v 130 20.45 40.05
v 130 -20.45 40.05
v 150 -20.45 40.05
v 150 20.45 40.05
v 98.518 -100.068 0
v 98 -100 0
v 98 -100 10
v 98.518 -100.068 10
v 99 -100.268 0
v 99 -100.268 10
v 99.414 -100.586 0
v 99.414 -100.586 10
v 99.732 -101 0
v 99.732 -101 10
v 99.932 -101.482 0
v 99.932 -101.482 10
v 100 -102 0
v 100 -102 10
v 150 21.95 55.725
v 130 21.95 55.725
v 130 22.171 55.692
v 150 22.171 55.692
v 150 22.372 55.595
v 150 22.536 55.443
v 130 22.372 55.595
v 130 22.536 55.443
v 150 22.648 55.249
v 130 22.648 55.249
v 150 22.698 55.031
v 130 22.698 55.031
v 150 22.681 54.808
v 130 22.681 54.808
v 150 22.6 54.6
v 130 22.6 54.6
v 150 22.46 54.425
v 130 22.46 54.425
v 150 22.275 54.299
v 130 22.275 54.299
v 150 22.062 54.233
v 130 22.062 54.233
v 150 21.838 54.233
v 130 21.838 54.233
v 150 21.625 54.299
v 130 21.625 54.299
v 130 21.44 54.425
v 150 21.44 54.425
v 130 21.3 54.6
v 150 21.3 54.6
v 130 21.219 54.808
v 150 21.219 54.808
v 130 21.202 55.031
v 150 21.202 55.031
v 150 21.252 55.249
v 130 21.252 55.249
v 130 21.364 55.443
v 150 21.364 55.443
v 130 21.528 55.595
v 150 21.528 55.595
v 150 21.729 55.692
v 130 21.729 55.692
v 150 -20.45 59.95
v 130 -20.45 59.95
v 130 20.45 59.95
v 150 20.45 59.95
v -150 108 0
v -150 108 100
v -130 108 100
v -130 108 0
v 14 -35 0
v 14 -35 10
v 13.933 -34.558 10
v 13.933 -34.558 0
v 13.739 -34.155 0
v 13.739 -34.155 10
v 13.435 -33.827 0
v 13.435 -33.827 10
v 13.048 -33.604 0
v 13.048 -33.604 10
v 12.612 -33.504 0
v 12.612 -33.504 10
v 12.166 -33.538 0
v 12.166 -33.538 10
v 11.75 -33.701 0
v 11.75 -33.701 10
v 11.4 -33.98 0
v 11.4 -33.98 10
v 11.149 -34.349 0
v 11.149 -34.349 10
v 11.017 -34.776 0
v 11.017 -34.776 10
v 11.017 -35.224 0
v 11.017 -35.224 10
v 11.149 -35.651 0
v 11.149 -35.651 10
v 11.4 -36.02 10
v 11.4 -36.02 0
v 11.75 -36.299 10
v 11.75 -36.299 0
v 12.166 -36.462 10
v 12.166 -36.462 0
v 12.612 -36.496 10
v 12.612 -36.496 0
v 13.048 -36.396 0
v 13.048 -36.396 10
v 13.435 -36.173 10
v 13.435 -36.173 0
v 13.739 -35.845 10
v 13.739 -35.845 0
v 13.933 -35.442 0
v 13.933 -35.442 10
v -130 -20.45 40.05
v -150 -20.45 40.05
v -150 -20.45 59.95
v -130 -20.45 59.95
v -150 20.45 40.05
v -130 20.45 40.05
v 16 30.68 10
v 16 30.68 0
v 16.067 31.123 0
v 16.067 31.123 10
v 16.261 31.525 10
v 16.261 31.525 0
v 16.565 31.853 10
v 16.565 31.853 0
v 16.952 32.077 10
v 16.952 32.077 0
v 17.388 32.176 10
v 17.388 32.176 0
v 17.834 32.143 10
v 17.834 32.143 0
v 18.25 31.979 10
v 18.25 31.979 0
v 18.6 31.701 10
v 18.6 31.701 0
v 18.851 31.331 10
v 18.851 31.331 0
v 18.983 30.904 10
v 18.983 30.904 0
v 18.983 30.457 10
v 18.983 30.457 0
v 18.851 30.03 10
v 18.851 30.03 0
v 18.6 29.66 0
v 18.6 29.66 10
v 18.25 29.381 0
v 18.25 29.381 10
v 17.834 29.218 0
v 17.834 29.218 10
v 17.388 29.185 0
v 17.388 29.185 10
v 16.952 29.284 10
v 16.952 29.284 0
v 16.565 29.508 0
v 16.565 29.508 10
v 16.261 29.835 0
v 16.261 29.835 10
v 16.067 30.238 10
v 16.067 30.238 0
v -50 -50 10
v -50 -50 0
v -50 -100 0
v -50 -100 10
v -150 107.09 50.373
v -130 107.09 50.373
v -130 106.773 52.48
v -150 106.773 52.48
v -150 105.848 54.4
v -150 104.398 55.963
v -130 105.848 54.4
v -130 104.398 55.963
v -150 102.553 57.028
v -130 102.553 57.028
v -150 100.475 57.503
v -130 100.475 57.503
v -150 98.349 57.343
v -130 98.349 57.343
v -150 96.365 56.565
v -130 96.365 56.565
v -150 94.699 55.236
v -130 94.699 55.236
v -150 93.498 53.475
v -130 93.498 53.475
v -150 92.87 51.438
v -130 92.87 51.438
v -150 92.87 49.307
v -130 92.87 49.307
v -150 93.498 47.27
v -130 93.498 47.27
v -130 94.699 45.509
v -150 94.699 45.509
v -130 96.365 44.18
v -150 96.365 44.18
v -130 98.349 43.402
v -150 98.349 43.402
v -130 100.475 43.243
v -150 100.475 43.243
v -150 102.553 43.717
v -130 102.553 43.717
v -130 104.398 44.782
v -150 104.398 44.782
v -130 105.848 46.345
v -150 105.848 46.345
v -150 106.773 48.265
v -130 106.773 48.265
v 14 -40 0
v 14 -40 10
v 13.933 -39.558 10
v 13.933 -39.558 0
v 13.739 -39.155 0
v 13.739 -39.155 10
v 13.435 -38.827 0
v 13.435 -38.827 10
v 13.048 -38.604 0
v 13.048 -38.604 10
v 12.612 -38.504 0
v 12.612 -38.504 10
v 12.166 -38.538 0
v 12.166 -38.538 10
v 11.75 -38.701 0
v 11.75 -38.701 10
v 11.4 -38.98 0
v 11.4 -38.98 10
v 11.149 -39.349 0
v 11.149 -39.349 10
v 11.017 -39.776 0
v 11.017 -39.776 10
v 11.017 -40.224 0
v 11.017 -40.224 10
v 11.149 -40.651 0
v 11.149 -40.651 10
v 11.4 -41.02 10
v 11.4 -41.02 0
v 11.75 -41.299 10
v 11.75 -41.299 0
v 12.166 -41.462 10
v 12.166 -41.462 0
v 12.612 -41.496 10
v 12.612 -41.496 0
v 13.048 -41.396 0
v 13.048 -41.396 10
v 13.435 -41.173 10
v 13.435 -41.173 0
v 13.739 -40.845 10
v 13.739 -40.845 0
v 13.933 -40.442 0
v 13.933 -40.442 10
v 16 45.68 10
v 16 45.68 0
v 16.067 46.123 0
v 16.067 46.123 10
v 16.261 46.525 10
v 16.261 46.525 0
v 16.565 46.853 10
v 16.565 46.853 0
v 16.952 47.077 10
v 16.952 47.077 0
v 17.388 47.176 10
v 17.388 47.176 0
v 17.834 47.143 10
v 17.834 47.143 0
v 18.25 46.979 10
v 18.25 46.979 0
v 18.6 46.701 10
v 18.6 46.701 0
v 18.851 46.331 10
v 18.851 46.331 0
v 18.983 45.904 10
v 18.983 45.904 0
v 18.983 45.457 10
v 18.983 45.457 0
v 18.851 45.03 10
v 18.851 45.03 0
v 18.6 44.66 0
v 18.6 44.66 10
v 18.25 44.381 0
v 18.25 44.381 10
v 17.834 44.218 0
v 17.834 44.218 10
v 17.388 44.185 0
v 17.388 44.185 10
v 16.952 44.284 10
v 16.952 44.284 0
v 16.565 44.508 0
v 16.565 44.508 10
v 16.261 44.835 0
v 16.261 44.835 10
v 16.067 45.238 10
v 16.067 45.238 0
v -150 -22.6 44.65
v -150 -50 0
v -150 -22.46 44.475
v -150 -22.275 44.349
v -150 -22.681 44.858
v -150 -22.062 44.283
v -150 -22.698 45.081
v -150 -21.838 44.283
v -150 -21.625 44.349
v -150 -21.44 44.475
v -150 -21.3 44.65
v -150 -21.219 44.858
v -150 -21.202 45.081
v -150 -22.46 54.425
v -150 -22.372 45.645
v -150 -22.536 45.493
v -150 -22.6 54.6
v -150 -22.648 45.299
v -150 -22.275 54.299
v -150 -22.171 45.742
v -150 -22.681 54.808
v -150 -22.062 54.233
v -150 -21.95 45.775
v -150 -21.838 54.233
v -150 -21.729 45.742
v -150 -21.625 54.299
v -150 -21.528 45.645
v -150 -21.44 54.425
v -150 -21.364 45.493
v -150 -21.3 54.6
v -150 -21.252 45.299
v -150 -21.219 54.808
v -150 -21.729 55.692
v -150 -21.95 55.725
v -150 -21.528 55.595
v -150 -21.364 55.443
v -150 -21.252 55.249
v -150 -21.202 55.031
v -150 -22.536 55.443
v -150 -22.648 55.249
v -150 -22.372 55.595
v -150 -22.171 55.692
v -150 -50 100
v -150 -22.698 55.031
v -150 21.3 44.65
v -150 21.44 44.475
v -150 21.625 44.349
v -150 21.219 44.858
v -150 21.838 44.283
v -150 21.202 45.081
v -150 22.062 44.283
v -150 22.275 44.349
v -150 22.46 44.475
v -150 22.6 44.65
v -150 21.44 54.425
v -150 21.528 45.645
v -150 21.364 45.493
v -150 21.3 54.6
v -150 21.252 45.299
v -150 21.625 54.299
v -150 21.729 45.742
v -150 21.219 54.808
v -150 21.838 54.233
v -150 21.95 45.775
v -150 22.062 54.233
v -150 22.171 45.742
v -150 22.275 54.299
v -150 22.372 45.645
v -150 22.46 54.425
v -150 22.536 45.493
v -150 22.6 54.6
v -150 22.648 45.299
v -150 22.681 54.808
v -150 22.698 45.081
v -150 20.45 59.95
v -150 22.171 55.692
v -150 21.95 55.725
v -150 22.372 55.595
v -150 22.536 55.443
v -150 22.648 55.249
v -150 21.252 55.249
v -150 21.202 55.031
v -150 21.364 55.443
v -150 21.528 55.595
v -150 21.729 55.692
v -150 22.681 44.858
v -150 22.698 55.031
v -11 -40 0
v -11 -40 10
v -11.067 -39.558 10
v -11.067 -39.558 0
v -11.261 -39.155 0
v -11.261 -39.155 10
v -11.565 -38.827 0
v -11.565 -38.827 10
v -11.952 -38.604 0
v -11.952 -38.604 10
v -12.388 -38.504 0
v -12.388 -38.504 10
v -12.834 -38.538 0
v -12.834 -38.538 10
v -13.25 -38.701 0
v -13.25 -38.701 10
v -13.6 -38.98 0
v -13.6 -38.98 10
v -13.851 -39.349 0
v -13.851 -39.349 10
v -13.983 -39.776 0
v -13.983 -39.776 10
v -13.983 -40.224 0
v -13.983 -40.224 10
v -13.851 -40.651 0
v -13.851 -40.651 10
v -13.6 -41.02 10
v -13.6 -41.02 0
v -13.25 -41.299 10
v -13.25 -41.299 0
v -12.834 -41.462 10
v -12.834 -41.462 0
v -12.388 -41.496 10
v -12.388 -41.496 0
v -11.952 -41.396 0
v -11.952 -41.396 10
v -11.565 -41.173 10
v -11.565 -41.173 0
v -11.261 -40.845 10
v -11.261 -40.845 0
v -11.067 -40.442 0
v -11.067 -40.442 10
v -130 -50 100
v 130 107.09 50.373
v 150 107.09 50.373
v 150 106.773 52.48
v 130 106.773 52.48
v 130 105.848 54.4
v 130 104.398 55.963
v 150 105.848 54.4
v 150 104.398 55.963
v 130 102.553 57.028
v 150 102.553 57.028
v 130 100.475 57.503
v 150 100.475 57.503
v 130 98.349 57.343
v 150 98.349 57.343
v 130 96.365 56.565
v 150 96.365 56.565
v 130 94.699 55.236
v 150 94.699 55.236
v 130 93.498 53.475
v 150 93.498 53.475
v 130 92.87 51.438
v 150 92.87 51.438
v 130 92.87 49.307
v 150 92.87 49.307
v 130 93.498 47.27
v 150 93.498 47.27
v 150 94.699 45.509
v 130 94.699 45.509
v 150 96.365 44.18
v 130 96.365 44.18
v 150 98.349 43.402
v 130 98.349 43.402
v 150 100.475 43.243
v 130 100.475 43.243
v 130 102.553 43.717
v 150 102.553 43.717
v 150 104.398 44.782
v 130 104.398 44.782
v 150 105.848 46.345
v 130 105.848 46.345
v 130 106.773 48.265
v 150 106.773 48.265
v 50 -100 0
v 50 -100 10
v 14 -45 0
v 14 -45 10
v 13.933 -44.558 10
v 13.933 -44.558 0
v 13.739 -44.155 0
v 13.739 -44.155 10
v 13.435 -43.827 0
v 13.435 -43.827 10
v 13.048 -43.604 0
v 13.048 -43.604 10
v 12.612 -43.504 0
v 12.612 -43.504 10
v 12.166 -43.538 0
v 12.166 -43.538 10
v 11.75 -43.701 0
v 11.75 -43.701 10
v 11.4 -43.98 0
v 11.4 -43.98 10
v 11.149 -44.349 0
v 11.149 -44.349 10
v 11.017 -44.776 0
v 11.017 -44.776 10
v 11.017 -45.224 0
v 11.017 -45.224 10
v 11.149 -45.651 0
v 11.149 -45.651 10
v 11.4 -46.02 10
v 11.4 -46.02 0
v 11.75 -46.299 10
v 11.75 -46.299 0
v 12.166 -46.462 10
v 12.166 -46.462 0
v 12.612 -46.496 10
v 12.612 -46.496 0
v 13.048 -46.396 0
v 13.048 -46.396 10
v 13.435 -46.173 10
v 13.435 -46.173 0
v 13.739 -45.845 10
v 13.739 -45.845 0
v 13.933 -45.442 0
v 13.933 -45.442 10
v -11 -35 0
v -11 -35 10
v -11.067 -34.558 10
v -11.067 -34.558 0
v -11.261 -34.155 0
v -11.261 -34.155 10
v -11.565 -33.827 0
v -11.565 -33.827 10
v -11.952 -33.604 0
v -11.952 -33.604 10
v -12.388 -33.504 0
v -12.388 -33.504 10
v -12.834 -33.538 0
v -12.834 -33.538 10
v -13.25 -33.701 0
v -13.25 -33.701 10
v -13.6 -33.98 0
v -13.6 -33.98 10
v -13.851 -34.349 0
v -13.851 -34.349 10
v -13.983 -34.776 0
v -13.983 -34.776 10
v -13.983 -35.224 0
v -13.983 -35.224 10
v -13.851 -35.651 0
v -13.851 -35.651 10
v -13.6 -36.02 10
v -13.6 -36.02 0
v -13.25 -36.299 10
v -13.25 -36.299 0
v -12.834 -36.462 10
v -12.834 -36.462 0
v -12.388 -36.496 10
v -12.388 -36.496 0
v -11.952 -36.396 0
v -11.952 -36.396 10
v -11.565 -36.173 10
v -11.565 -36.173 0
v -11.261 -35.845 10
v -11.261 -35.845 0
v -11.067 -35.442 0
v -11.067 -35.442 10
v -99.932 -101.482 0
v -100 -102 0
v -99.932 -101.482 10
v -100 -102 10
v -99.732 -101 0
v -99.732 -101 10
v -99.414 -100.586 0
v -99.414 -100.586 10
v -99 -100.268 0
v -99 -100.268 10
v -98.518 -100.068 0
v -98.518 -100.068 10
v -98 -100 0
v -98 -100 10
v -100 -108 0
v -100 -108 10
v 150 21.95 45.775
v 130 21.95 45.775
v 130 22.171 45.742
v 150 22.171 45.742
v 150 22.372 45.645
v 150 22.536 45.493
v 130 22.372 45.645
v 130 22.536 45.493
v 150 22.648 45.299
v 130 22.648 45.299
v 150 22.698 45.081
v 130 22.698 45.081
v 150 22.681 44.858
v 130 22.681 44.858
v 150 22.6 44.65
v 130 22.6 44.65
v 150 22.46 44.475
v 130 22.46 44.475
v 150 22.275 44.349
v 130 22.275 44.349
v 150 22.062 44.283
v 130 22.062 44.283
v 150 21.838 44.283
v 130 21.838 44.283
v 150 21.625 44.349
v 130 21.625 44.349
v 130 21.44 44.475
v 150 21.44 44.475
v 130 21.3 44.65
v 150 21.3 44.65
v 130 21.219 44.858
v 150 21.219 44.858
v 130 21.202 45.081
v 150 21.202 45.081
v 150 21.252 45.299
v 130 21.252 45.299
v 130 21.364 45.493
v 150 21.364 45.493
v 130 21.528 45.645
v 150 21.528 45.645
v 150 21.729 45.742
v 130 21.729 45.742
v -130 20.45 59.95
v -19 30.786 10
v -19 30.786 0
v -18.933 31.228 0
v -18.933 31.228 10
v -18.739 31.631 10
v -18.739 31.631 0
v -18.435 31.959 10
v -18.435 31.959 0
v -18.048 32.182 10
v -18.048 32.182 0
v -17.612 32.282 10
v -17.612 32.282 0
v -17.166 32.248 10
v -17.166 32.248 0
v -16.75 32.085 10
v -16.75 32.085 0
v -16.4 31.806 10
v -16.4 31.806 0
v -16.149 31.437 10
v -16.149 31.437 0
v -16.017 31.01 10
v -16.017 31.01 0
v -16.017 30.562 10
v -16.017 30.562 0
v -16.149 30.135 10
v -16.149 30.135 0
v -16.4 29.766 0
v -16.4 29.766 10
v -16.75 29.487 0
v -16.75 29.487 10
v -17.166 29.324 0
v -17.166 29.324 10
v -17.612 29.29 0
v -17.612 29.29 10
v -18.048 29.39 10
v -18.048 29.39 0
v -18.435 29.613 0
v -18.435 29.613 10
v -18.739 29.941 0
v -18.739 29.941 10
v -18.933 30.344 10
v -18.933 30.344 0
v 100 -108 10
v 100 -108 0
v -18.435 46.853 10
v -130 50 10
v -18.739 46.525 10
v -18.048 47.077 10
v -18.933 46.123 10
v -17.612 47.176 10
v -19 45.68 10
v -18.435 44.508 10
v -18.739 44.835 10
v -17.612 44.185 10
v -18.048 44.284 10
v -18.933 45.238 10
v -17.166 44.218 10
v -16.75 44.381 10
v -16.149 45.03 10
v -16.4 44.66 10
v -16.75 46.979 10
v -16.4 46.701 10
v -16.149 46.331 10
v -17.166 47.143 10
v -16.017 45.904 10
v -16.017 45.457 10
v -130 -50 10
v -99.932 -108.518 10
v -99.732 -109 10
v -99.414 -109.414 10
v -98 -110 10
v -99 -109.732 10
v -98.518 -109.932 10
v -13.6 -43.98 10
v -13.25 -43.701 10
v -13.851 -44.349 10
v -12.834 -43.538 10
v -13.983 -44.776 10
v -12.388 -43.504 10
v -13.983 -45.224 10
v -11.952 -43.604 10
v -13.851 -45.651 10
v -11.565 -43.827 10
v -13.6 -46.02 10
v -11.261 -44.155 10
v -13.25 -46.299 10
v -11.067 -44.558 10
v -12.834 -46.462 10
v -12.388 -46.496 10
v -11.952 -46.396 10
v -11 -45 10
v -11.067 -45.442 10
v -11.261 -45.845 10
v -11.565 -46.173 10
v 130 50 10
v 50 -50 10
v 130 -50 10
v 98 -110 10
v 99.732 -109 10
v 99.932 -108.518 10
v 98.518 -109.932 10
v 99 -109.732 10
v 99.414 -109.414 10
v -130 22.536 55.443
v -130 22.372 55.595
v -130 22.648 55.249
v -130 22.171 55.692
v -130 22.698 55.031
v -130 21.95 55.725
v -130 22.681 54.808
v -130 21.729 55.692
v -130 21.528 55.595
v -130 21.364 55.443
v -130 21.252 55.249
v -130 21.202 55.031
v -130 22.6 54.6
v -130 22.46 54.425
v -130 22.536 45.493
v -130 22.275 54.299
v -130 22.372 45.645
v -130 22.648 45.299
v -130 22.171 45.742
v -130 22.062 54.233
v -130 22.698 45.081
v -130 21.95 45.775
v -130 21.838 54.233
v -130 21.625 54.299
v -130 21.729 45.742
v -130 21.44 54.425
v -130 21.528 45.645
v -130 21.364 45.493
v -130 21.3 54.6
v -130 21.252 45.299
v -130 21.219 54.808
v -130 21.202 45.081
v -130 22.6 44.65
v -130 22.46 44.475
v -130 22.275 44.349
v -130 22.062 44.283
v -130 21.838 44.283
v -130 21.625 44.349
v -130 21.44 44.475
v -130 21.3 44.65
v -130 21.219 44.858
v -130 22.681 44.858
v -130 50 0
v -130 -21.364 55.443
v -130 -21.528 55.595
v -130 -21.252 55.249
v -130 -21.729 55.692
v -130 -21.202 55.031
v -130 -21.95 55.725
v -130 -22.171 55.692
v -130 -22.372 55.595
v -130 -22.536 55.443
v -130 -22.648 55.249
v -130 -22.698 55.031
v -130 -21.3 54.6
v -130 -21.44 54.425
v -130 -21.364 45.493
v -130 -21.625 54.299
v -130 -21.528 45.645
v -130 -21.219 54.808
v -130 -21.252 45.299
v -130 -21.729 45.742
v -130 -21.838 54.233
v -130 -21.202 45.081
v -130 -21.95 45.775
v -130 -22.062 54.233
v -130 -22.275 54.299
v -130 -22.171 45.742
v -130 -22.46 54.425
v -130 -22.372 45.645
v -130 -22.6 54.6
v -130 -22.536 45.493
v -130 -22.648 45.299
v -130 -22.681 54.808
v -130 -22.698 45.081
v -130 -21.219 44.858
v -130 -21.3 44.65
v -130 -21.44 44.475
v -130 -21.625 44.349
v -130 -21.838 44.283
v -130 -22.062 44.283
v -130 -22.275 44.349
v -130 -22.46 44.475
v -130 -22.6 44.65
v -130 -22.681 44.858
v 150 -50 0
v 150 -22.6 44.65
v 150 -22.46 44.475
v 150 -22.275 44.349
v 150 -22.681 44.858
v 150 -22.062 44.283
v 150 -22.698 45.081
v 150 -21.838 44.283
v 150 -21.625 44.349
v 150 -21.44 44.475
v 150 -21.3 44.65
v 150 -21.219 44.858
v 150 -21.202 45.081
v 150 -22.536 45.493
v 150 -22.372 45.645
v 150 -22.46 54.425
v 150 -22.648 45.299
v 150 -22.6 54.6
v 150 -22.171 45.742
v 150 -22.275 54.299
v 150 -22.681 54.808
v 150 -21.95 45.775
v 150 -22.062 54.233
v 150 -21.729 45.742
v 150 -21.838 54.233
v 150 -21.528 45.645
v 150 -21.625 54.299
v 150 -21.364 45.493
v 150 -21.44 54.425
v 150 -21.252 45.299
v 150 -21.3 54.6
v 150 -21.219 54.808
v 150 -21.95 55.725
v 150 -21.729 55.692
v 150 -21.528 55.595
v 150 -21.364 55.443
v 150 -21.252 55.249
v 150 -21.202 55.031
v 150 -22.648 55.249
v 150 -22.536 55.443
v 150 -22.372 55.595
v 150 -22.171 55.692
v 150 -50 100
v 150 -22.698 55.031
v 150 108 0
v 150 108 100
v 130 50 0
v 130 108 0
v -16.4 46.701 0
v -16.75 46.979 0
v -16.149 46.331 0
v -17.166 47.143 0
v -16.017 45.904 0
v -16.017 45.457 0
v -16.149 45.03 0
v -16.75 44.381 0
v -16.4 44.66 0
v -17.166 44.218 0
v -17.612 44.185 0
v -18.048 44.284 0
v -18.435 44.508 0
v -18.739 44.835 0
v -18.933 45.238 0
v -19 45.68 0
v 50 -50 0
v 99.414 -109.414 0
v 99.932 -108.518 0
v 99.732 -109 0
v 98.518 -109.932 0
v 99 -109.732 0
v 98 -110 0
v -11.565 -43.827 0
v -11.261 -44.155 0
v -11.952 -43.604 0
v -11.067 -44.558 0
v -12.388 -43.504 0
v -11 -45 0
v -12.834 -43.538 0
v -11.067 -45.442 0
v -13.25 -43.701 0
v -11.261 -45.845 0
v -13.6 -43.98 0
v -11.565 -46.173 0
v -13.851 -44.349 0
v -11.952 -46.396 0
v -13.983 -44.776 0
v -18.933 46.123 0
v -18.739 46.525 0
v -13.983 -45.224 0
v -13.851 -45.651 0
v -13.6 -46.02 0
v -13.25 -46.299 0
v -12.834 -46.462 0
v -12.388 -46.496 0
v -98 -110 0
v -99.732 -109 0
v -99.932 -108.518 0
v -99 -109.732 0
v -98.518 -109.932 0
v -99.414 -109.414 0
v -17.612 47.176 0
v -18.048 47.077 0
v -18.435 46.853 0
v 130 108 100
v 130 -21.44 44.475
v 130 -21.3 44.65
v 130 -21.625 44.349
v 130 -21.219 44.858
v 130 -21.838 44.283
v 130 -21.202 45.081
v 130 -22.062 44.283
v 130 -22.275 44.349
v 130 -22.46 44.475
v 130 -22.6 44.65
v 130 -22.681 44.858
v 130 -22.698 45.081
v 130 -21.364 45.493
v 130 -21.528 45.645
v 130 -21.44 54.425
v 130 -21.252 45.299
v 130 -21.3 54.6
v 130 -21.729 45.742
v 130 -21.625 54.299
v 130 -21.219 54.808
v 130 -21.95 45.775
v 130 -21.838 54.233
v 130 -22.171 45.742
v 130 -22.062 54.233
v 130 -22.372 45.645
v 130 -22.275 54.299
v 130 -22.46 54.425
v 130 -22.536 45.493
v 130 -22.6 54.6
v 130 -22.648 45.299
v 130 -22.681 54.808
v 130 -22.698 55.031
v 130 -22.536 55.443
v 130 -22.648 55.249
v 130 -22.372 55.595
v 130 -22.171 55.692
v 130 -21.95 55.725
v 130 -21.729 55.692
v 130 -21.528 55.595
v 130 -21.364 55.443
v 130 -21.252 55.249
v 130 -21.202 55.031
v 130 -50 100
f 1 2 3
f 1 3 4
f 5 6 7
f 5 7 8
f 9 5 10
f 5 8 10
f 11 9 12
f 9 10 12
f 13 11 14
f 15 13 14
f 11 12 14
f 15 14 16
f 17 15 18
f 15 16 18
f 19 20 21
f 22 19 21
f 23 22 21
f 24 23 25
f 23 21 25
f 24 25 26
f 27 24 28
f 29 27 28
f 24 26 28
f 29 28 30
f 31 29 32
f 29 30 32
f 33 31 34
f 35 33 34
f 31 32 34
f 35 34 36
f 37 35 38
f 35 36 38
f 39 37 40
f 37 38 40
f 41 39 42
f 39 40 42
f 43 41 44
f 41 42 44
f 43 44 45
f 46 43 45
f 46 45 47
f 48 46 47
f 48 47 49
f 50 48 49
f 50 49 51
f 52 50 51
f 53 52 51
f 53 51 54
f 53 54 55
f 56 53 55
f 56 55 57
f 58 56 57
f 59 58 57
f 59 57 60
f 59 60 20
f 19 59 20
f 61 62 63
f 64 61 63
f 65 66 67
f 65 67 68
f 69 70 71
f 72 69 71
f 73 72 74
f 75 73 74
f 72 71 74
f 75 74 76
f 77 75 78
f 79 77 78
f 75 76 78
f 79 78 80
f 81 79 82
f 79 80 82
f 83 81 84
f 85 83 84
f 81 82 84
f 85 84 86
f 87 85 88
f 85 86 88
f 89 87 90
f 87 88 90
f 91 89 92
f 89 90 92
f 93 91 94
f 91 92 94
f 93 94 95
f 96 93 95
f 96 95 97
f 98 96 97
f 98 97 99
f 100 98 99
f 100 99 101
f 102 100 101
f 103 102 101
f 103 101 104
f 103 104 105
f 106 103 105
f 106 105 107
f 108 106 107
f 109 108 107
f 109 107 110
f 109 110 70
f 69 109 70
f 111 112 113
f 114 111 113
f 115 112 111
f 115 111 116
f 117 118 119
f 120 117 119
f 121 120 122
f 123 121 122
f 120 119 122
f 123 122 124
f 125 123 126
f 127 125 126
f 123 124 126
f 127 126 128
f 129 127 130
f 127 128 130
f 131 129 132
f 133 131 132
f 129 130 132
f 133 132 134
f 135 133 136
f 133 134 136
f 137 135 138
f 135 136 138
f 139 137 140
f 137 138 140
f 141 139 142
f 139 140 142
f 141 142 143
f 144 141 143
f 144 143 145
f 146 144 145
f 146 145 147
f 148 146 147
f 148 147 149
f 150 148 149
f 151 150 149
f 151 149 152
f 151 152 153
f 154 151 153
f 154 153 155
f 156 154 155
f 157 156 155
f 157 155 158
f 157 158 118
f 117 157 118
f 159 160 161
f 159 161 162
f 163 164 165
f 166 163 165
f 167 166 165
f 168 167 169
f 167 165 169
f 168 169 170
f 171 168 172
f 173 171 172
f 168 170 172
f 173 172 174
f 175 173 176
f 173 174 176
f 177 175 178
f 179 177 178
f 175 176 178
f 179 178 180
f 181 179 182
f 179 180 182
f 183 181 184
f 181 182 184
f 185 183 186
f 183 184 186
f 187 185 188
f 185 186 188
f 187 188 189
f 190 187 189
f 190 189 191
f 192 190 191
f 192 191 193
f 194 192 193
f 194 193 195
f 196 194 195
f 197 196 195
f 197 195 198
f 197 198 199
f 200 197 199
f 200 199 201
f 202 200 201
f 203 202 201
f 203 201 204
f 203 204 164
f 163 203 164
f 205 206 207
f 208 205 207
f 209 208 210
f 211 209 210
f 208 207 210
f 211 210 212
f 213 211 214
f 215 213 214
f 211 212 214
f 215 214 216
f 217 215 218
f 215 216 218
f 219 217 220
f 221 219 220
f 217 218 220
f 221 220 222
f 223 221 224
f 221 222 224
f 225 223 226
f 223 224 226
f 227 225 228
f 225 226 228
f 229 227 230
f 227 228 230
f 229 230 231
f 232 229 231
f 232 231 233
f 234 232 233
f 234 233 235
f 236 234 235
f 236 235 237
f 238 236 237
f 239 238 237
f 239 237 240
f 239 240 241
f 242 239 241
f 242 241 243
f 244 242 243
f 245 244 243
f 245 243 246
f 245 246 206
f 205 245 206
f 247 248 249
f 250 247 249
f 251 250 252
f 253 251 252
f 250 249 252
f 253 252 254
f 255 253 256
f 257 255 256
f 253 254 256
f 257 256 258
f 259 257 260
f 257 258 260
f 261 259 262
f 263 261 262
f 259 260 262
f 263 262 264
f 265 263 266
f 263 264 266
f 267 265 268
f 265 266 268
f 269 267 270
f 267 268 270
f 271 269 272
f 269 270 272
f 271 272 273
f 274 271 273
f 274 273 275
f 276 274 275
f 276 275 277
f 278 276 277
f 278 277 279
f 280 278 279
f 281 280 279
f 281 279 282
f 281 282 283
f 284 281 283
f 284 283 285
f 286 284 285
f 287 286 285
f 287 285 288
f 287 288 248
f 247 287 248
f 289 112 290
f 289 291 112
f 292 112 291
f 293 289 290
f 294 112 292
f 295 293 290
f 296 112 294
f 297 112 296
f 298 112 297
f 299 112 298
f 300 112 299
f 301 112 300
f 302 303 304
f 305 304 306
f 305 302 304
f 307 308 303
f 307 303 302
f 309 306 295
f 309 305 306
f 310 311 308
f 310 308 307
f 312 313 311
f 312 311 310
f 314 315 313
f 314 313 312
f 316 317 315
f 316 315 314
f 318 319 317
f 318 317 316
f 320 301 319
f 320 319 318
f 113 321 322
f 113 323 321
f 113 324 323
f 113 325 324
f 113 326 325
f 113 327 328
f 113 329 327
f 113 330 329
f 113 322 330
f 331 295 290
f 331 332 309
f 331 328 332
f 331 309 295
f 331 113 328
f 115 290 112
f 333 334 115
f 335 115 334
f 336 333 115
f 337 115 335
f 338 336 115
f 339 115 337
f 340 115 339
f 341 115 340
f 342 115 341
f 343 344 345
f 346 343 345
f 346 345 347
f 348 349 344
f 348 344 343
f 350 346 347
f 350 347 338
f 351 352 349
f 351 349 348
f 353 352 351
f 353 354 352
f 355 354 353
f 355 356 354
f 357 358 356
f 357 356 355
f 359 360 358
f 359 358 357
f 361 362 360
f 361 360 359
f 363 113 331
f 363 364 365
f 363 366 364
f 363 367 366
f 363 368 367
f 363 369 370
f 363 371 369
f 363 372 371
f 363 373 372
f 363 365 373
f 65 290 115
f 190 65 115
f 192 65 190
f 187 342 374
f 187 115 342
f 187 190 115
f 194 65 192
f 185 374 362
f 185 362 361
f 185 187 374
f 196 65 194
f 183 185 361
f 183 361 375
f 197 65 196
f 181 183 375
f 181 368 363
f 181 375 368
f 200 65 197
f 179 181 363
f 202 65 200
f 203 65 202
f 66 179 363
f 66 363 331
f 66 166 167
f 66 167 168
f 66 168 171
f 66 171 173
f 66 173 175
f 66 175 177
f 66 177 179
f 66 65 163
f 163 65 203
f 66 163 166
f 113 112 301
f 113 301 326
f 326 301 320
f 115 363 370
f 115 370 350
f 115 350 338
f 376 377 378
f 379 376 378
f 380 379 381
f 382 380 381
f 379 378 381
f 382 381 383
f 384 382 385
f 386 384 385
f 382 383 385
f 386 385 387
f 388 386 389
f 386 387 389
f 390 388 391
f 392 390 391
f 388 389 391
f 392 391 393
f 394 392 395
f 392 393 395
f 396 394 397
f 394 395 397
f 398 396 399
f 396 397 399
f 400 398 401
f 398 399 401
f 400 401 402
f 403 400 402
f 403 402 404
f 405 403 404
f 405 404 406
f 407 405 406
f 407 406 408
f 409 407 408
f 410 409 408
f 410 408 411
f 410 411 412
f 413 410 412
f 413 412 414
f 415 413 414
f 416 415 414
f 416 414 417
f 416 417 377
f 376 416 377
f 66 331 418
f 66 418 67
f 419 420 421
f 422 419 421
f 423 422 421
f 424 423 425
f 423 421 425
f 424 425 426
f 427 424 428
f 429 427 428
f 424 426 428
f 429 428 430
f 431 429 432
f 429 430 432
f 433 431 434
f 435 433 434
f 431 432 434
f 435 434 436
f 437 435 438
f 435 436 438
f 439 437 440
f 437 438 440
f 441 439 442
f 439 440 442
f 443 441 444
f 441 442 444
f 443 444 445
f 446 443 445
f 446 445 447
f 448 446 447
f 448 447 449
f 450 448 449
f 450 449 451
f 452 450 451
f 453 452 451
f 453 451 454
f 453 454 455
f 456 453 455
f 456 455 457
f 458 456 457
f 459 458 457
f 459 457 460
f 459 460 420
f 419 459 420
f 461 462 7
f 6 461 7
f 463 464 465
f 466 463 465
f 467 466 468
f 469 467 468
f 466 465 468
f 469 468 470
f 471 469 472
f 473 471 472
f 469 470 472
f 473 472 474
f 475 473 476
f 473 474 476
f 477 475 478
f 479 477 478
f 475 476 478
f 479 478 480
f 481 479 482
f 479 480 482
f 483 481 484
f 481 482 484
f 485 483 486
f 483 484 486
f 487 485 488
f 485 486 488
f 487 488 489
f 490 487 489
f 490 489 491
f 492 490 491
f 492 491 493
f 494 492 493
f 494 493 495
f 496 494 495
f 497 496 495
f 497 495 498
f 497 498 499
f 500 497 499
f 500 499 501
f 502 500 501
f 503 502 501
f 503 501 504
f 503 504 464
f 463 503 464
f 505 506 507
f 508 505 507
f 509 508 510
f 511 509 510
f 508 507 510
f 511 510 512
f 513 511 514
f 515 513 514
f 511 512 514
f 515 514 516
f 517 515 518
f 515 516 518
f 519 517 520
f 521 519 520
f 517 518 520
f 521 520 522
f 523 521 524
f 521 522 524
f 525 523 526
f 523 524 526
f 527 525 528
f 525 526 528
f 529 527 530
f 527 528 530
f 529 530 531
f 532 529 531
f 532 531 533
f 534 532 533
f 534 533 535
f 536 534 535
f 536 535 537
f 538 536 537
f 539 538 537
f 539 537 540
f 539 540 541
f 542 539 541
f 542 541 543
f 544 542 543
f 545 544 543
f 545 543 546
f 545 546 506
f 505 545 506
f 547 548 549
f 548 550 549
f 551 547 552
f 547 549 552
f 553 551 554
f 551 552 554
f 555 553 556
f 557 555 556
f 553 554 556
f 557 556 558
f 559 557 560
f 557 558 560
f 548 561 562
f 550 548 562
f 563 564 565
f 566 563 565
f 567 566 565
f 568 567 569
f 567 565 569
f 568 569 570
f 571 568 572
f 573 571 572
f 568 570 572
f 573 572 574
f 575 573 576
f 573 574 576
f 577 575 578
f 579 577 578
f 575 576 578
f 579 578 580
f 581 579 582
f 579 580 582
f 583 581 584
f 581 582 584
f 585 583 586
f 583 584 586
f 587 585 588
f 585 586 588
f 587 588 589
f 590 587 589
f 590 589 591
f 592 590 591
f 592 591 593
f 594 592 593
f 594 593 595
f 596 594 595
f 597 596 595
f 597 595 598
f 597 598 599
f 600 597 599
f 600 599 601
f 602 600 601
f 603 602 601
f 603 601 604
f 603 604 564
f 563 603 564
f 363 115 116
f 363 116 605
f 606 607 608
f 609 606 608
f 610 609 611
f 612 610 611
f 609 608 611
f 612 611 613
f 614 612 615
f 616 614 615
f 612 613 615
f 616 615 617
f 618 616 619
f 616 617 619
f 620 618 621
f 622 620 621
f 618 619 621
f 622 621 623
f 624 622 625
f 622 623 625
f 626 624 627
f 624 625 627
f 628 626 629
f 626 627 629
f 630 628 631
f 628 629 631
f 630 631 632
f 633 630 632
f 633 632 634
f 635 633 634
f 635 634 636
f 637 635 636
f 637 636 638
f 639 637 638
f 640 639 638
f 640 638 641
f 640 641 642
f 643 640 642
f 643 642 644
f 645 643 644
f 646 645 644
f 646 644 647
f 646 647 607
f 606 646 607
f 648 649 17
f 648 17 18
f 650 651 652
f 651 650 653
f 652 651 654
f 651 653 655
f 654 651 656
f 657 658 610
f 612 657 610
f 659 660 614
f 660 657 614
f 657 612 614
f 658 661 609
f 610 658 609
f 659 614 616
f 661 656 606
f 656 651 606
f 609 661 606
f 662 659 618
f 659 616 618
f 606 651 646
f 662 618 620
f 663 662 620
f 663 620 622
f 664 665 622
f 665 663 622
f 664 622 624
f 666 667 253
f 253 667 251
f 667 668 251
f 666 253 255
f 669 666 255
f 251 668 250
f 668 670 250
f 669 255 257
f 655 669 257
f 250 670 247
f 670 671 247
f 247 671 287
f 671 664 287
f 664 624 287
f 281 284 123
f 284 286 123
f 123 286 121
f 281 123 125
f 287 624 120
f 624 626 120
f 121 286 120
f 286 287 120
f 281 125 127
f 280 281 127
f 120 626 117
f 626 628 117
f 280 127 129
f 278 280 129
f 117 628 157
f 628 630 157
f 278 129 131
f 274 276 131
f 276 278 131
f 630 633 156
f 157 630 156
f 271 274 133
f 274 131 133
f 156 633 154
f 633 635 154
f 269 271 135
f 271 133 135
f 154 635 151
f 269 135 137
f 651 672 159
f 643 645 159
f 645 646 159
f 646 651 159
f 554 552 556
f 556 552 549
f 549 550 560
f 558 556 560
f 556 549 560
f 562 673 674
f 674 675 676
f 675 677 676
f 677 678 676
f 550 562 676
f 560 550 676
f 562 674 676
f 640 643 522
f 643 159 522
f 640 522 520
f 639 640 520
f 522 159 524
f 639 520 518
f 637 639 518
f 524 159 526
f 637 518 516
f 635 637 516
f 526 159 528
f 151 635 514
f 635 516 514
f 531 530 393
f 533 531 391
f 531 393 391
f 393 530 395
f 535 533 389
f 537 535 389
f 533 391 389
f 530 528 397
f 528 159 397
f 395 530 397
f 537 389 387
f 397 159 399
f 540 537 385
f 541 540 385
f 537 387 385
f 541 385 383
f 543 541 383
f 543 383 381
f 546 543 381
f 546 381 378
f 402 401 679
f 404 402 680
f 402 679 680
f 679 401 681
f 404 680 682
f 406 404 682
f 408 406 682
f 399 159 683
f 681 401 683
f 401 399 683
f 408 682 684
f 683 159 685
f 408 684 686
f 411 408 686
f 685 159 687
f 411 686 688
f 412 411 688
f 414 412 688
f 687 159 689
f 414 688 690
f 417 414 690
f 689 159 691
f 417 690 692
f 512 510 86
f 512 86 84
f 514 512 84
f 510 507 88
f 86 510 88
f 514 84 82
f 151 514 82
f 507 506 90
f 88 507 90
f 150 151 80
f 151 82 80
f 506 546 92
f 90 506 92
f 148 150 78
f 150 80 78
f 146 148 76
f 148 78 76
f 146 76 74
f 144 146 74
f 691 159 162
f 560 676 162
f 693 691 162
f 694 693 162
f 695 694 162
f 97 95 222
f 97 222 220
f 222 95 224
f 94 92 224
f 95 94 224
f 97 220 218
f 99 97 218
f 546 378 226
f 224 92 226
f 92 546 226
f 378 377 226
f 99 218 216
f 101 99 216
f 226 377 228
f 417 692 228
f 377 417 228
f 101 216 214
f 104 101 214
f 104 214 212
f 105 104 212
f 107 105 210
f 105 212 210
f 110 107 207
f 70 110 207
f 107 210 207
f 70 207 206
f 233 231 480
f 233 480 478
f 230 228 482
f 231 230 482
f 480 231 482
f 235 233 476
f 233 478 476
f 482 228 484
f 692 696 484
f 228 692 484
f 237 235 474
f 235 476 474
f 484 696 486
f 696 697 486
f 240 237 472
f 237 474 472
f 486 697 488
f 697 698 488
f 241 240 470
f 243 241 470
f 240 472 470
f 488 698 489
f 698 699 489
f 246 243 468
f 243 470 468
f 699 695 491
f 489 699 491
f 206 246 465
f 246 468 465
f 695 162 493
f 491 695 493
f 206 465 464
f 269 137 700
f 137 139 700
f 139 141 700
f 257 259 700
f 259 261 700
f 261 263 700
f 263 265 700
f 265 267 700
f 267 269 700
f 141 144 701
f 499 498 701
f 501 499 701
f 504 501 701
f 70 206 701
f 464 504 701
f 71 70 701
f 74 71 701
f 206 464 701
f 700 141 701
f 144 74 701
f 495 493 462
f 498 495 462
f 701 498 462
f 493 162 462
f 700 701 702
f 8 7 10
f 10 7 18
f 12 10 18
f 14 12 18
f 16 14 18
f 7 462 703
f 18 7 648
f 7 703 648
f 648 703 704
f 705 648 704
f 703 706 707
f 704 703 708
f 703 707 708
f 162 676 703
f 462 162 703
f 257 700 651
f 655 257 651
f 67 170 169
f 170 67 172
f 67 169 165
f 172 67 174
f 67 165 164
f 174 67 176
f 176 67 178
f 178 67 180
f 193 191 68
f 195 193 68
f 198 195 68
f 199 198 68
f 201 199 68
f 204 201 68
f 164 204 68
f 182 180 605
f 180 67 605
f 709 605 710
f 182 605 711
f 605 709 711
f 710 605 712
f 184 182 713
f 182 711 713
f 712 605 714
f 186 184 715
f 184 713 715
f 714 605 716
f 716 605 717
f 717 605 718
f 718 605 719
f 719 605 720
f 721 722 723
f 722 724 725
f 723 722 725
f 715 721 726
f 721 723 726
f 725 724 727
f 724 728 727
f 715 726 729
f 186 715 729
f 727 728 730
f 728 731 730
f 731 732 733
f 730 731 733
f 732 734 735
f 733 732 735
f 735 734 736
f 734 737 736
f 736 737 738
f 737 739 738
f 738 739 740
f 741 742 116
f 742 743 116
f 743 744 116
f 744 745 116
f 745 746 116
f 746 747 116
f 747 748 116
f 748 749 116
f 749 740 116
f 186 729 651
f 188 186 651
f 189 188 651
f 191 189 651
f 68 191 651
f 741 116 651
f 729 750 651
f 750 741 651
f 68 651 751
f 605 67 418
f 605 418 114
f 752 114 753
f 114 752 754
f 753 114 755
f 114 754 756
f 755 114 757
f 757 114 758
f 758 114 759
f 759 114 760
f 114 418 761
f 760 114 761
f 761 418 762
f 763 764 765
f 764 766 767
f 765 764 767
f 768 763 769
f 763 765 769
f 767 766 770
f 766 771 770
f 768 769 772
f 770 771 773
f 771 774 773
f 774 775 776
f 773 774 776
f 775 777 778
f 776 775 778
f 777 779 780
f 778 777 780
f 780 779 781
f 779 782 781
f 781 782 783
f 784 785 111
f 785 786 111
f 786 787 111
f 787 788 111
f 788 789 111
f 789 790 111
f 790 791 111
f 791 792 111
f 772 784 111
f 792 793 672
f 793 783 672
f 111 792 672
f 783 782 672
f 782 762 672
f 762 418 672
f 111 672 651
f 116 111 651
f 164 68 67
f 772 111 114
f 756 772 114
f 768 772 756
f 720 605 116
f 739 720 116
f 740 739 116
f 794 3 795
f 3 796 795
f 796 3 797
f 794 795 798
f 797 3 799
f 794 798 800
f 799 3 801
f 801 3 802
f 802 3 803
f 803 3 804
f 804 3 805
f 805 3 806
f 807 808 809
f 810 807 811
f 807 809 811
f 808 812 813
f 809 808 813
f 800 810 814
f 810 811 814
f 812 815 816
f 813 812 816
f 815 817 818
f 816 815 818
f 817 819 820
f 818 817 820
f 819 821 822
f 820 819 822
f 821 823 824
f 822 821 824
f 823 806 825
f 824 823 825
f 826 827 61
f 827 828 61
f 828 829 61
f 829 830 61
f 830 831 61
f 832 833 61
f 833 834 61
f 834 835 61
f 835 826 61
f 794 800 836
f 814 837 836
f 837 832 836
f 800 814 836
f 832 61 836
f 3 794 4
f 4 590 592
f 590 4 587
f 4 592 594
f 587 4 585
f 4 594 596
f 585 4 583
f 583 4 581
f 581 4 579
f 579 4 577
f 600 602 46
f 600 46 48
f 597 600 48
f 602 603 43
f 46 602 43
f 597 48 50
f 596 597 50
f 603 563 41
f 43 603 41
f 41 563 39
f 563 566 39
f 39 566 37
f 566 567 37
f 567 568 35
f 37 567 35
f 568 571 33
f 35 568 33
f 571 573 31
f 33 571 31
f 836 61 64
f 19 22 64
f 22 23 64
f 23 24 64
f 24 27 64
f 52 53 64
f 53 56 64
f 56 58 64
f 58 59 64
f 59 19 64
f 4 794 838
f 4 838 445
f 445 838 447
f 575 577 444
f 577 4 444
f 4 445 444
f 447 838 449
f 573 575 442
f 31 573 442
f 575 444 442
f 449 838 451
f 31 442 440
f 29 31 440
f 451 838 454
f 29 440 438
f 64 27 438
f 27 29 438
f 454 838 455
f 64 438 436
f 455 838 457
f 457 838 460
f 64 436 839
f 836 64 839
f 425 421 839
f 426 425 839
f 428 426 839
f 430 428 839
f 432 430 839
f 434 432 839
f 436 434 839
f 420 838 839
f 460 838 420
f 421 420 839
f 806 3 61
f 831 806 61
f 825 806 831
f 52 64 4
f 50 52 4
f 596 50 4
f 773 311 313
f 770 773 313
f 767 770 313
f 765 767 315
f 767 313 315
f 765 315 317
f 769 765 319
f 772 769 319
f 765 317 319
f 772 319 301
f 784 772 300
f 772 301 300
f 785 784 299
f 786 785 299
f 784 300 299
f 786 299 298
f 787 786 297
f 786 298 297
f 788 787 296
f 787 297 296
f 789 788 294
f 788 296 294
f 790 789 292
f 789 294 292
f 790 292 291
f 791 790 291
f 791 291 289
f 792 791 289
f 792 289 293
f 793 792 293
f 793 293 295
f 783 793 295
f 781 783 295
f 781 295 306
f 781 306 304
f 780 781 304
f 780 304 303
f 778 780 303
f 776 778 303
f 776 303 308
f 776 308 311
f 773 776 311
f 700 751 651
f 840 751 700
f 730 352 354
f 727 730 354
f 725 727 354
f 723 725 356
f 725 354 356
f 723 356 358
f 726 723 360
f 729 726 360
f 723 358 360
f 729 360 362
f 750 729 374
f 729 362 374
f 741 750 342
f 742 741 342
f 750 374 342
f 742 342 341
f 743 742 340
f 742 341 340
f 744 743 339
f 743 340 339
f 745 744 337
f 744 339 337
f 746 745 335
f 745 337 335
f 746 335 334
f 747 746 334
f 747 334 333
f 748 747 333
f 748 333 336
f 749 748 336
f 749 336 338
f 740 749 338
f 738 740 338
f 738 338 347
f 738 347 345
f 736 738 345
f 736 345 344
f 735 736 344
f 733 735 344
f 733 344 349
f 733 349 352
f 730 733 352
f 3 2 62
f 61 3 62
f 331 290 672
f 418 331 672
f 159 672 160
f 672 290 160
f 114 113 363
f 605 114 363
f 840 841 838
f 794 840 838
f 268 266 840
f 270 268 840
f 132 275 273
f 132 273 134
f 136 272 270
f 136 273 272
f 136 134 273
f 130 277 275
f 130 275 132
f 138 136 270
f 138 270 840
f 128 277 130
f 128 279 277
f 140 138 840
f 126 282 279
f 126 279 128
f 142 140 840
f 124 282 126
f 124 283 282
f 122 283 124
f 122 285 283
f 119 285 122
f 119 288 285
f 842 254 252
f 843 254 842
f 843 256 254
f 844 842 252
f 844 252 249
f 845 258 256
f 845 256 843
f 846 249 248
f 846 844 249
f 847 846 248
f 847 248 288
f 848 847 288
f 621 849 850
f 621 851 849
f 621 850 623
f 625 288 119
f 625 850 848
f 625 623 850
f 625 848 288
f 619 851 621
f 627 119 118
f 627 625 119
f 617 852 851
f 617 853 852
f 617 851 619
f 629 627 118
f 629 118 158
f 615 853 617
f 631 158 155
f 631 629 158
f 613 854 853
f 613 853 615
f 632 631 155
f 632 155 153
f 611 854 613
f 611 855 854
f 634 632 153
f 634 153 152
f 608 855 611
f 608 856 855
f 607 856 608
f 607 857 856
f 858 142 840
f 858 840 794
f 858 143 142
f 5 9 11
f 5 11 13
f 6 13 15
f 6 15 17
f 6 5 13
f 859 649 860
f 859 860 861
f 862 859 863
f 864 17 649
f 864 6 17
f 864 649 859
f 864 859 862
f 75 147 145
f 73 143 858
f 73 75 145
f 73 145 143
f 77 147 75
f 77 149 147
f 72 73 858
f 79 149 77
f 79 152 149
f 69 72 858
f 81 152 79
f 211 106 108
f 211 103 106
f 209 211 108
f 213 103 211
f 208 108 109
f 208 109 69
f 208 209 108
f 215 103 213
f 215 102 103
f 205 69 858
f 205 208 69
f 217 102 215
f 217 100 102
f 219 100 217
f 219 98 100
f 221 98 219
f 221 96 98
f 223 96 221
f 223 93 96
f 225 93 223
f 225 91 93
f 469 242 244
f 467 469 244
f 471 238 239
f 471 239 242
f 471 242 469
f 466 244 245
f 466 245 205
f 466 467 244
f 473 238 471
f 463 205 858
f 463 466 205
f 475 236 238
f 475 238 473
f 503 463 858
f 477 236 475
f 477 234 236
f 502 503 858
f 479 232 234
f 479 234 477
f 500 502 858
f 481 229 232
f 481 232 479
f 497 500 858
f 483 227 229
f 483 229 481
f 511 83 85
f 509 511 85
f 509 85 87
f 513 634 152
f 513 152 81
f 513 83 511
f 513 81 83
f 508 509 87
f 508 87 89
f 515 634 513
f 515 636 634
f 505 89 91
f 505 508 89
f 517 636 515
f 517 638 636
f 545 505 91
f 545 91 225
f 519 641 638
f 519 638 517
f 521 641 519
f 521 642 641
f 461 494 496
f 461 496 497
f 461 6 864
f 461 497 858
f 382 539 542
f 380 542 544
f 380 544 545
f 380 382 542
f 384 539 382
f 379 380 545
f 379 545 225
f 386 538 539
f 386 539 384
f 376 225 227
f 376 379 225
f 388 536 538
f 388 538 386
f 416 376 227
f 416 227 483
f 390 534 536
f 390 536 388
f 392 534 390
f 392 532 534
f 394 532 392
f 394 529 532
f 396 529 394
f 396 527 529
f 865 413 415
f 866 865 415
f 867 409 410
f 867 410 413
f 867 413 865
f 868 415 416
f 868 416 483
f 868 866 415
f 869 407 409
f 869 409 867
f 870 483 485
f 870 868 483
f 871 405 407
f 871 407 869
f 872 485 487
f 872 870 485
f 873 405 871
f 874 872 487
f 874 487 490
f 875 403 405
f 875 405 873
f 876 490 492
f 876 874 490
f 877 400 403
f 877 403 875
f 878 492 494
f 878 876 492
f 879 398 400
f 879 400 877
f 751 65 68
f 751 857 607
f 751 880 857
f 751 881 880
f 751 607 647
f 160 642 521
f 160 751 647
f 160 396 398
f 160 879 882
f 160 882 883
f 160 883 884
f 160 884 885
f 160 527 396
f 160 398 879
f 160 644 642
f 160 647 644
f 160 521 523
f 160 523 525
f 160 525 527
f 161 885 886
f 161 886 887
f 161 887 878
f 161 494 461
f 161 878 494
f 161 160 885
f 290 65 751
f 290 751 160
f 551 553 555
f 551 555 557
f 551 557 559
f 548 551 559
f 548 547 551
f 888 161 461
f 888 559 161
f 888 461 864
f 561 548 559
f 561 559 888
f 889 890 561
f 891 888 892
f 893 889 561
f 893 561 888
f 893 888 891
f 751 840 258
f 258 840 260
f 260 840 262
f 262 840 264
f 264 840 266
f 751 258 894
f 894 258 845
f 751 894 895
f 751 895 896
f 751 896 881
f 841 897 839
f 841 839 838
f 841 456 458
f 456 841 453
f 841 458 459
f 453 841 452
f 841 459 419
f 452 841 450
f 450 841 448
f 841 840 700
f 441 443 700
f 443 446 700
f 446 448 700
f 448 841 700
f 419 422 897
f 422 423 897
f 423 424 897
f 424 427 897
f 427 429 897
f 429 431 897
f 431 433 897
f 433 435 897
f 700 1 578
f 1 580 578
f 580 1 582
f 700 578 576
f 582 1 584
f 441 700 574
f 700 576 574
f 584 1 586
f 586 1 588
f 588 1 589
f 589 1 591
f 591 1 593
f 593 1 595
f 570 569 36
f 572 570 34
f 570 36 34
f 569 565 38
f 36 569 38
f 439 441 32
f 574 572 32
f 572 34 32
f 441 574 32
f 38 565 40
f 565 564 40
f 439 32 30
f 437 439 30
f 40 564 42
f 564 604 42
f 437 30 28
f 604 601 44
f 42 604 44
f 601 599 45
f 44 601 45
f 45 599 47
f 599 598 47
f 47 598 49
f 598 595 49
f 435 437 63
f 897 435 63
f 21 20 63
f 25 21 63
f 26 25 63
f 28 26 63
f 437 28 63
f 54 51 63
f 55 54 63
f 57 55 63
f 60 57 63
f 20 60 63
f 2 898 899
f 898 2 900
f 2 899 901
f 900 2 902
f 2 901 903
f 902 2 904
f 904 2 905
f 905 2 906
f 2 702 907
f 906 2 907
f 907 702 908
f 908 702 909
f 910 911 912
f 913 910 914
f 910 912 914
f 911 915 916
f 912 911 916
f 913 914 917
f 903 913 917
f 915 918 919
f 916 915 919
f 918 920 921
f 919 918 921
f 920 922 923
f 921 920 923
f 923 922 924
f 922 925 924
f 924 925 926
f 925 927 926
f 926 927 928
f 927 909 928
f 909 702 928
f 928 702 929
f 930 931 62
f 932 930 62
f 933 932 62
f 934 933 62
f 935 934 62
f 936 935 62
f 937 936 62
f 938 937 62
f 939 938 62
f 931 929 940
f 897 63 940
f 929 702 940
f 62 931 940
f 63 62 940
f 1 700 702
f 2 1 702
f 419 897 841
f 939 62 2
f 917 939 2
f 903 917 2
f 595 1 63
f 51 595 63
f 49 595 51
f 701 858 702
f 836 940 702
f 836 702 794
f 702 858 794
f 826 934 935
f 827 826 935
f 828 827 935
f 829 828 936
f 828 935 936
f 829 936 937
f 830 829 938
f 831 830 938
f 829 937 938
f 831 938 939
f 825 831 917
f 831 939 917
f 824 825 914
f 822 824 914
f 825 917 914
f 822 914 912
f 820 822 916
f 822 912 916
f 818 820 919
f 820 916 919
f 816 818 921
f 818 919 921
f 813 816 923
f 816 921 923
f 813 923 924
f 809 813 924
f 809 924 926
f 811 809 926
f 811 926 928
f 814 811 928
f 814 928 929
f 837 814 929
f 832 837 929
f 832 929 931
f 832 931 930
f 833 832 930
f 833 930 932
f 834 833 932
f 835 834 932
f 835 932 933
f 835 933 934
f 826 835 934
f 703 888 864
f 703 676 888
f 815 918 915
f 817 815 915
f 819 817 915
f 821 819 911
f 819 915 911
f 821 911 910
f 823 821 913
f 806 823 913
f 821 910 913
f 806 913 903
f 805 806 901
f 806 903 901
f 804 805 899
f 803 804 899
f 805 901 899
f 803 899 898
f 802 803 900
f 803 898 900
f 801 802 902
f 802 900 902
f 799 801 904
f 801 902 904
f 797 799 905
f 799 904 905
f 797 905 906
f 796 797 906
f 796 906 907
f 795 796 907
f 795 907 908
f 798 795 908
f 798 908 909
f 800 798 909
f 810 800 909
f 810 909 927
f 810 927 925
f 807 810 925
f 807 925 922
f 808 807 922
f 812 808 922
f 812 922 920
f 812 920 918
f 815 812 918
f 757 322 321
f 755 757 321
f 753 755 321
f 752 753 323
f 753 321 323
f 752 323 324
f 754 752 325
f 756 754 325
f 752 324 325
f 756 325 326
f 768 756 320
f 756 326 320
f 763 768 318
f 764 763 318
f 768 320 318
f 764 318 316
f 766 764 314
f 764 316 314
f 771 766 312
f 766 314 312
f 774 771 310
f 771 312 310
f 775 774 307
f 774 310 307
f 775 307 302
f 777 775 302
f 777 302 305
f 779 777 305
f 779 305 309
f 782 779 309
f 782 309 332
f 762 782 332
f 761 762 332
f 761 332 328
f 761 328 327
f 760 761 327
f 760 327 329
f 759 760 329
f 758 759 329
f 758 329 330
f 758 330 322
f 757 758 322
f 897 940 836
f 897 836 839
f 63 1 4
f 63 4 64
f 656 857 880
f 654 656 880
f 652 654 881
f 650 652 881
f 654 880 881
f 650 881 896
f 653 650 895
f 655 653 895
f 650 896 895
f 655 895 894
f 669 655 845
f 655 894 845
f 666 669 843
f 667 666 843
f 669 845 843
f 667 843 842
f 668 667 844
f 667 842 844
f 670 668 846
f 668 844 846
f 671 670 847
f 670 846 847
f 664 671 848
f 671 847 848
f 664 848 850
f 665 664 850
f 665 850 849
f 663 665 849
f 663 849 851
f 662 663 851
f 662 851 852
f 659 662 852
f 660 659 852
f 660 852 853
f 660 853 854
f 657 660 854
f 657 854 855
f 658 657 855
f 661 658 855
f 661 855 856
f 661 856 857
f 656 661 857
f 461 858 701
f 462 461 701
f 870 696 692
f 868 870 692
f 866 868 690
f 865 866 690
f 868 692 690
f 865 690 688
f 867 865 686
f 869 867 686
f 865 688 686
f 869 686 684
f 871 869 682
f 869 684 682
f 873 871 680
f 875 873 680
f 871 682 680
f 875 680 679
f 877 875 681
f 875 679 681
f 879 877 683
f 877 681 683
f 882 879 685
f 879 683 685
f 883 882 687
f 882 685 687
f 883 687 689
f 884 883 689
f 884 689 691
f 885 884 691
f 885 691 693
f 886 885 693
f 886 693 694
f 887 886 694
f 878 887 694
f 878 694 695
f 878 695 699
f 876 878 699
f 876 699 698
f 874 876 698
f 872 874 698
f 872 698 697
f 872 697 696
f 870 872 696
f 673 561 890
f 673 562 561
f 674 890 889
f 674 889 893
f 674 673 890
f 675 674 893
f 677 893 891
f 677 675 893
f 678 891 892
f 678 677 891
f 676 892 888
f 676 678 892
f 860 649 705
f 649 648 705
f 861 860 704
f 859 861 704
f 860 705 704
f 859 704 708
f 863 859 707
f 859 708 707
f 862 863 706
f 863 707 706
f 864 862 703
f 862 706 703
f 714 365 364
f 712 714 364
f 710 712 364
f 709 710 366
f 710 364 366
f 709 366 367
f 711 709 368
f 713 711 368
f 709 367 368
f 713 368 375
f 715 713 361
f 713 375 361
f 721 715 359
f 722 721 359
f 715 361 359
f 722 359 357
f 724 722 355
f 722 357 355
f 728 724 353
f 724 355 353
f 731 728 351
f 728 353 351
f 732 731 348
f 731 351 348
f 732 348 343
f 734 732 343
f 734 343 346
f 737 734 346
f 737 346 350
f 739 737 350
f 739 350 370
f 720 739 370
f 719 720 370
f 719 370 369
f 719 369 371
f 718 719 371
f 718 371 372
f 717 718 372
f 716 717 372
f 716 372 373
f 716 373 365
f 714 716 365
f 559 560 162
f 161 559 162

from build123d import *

# Parameters (mm, degrees)
SKETCH1_W           = 300
SKETCH1_H           = 100
BOSS_EXTRUDE1_DEPTH = 10
SKETCH2_W           = 20
SKETCH2_H           = 100
BOSS_EXTRUDE2_DEPTH = 90
SKETCH3_W           = 19.9
SKETCH3_H           = 40.9
SKETCH3_R           = 0.75
CUT_EXTRUDE1_DEPTH  = 321.156211872
SKETCH4_W           = 100
SKETCH4_H           = 10
BOSS_EXTRUDE4_DEPTH = 60
SKETCH6_W           = 200
SKETCH6_H           = 10
BOSS_EXTRUDE5_DEPTH = 10
FILLET1_R           = 2
SKETCH8_W           = 20
SKETCH8_H           = 100
BOSS_EXTRUDE7_DEPTH = 50
BOSS_EXTRUDE9_DEPTH = 300
SKETCH12_W          = 260
SKETCH12_H          = 100
CUT_EXTRUDE4_DEPTH  = 20
SKETCH13_R          = 1.5
CUT_EXTRUDE5_DEPTH  = 207.639783198
SKETCH14_R          = 7.15
CUT_EXTRUDE7_DEPTH  = 335.813380856
SKETCH15_R          = 1.5
CUT_EXTRUDE8_DEPTH  = 212.187120819


with BuildPart() as part:
    # Sketch1 → Boss-Extrude1 (new body)
    with BuildSketch(Plane.XY):
        Rectangle(SKETCH1_W, SKETCH1_H)
    extrude(amount=BOSS_EXTRUDE1_DEPTH)

    # Sketch2 → Boss-Extrude2 (add)
    with BuildSketch(Plane.XY.offset(10)):
        with Locations((-140, 0)):
            Rectangle(SKETCH2_W, SKETCH2_H)
        with Locations((140, 0)):
            Rectangle(SKETCH2_W, SKETCH2_H)
    extrude(amount=BOSS_EXTRUDE2_DEPTH)

    # Sketch3 → Cut-Extrude1 (cut, through all)
    with BuildSketch(Plane.ZY.offset(150)):
        with Locations((50, 0)):
            Rectangle(SKETCH3_W, SKETCH3_H)
        with Locations((45.025, 21.95)):
            Circle(SKETCH3_R)
        with Locations((54.975, 21.95)):
            Circle(SKETCH3_R)
        with Locations((45.025, -21.95)):
            Circle(SKETCH3_R)
        with Locations((54.975, -21.95)):
            Circle(SKETCH3_R)
    extrude(amount=-CUT_EXTRUDE1_DEPTH, mode=Mode.SUBTRACT)

    # Sketch4 → Boss-Extrude4 (add)
    with BuildSketch(Plane.XZ.offset(50)):
        with Locations((0, 5)):
            Rectangle(SKETCH4_W, SKETCH4_H)
    extrude(amount=BOSS_EXTRUDE4_DEPTH)

    # Sketch6 → Boss-Extrude5 (add)
    with BuildSketch(Plane.XZ.offset(110)):
        with Locations((0, 5)):
            Rectangle(SKETCH6_W, SKETCH6_H)
    extrude(amount=-BOSS_EXTRUDE5_DEPTH)

    # Fillet1
    fillet1_edges = [part.edges().sort_by_distance(p)[0] for p in [
        (-100, -110, 5),
        (100, -100, 5),
        (-100, -100, 5),
        (100, -110, 5),
    ]]
    fillet(fillet1_edges, radius=FILLET1_R)

    # Sketch8 → Boss-Extrude7 (add)
    with BuildSketch(Plane(origin=(0, 50, 0), x_dir=(1, 0, 0), z_dir=(0, 1, 0))):
        with Locations((-140, -50)):
            Rectangle(SKETCH8_W, SKETCH8_H)
        with Locations((140, -50)):
            Rectangle(SKETCH8_W, SKETCH8_H)
    extrude(amount=BOSS_EXTRUDE7_DEPTH)

    # Sketch9 → Boss-Extrude9 (add, through all)
    with BuildSketch(Plane.ZY.offset(150)):
        with BuildLine():
            Line((0, 108), (0, 102.5))
            Line((0, 102.5), (48.5, 102.5))
            ThreePointArc((48.5, 102.5), (50, 104), (51.5, 102.5))
            Line((51.5, 102.5), (100, 102.5))
            Line((100, 102.5), (100, 108))
            Line((100, 108), (0, 108))
        make_face()
        with BuildLine():
            Line((0, 102.5), (0, 100))
            Line((0, 100), (100, 100))
            Line((100, 100), (100, 102.5))
            Line((100, 102.5), (51.5, 102.5))
            ThreePointArc((51.5, 102.5), (50, 101), (48.5, 102.5))
            Line((48.5, 102.5), (0, 102.5))
        make_face()
    extrude(amount=-BOSS_EXTRUDE9_DEPTH)

    # Sketch12 → Cut-Extrude4 (cut)
    with BuildSketch(Plane.XZ.offset(-100)):
        with Locations((0, 50)):
            Rectangle(SKETCH12_W, SKETCH12_H)
    extrude(amount=-CUT_EXTRUDE4_DEPTH, mode=Mode.SUBTRACT)

    # Sketch13 → Cut-Extrude5 (cut, through all)
    with BuildSketch(Plane.XY.offset(10)):
        with Locations((12.5, -35)):
            Circle(SKETCH13_R)
        with Locations((12.5, -40)):
            Circle(SKETCH13_R)
        with Locations((12.5, -45)):
            Circle(SKETCH13_R)
        with Locations((-12.5, -35)):
            Circle(SKETCH13_R)
        with Locations((-12.5, -40)):
            Circle(SKETCH13_R)
        with Locations((-12.5, -45)):
            Circle(SKETCH13_R)
    extrude(amount=-CUT_EXTRUDE5_DEPTH, mode=Mode.SUBTRACT)

    # Sketch14 → Cut-Extrude7 (cut, through all)
    with BuildSketch(Plane(origin=(150, 0, 0), x_dir=(0, 0, -1), z_dir=(1, 0, 0))):
        with Locations(Location((-50.372507489, 99.940398802, 0), (0, 0, 90))):
            Circle(SKETCH14_R)
    extrude(amount=-CUT_EXTRUDE7_DEPTH, mode=Mode.SUBTRACT)

    # Sketch15 → Cut-Extrude8 (cut, through all)
    with BuildSketch(Plane(origin=(0, 0, 0), x_dir=(-1, 0, 0), z_dir=(0, 0, -1))):
        with Locations((-17.5, 45.680401999)):
            Circle(SKETCH15_R)
        with Locations((17.5, 45.680401999)):
            Circle(SKETCH15_R)
        with Locations((-17.5, 30.680401999)):
            Circle(SKETCH15_R)
        with Locations((17.5, 30.786051179)):
            Circle(SKETCH15_R)
    extrude(amount=-CUT_EXTRUDE8_DEPTH, mode=Mode.SUBTRACT)


solid = part.part
